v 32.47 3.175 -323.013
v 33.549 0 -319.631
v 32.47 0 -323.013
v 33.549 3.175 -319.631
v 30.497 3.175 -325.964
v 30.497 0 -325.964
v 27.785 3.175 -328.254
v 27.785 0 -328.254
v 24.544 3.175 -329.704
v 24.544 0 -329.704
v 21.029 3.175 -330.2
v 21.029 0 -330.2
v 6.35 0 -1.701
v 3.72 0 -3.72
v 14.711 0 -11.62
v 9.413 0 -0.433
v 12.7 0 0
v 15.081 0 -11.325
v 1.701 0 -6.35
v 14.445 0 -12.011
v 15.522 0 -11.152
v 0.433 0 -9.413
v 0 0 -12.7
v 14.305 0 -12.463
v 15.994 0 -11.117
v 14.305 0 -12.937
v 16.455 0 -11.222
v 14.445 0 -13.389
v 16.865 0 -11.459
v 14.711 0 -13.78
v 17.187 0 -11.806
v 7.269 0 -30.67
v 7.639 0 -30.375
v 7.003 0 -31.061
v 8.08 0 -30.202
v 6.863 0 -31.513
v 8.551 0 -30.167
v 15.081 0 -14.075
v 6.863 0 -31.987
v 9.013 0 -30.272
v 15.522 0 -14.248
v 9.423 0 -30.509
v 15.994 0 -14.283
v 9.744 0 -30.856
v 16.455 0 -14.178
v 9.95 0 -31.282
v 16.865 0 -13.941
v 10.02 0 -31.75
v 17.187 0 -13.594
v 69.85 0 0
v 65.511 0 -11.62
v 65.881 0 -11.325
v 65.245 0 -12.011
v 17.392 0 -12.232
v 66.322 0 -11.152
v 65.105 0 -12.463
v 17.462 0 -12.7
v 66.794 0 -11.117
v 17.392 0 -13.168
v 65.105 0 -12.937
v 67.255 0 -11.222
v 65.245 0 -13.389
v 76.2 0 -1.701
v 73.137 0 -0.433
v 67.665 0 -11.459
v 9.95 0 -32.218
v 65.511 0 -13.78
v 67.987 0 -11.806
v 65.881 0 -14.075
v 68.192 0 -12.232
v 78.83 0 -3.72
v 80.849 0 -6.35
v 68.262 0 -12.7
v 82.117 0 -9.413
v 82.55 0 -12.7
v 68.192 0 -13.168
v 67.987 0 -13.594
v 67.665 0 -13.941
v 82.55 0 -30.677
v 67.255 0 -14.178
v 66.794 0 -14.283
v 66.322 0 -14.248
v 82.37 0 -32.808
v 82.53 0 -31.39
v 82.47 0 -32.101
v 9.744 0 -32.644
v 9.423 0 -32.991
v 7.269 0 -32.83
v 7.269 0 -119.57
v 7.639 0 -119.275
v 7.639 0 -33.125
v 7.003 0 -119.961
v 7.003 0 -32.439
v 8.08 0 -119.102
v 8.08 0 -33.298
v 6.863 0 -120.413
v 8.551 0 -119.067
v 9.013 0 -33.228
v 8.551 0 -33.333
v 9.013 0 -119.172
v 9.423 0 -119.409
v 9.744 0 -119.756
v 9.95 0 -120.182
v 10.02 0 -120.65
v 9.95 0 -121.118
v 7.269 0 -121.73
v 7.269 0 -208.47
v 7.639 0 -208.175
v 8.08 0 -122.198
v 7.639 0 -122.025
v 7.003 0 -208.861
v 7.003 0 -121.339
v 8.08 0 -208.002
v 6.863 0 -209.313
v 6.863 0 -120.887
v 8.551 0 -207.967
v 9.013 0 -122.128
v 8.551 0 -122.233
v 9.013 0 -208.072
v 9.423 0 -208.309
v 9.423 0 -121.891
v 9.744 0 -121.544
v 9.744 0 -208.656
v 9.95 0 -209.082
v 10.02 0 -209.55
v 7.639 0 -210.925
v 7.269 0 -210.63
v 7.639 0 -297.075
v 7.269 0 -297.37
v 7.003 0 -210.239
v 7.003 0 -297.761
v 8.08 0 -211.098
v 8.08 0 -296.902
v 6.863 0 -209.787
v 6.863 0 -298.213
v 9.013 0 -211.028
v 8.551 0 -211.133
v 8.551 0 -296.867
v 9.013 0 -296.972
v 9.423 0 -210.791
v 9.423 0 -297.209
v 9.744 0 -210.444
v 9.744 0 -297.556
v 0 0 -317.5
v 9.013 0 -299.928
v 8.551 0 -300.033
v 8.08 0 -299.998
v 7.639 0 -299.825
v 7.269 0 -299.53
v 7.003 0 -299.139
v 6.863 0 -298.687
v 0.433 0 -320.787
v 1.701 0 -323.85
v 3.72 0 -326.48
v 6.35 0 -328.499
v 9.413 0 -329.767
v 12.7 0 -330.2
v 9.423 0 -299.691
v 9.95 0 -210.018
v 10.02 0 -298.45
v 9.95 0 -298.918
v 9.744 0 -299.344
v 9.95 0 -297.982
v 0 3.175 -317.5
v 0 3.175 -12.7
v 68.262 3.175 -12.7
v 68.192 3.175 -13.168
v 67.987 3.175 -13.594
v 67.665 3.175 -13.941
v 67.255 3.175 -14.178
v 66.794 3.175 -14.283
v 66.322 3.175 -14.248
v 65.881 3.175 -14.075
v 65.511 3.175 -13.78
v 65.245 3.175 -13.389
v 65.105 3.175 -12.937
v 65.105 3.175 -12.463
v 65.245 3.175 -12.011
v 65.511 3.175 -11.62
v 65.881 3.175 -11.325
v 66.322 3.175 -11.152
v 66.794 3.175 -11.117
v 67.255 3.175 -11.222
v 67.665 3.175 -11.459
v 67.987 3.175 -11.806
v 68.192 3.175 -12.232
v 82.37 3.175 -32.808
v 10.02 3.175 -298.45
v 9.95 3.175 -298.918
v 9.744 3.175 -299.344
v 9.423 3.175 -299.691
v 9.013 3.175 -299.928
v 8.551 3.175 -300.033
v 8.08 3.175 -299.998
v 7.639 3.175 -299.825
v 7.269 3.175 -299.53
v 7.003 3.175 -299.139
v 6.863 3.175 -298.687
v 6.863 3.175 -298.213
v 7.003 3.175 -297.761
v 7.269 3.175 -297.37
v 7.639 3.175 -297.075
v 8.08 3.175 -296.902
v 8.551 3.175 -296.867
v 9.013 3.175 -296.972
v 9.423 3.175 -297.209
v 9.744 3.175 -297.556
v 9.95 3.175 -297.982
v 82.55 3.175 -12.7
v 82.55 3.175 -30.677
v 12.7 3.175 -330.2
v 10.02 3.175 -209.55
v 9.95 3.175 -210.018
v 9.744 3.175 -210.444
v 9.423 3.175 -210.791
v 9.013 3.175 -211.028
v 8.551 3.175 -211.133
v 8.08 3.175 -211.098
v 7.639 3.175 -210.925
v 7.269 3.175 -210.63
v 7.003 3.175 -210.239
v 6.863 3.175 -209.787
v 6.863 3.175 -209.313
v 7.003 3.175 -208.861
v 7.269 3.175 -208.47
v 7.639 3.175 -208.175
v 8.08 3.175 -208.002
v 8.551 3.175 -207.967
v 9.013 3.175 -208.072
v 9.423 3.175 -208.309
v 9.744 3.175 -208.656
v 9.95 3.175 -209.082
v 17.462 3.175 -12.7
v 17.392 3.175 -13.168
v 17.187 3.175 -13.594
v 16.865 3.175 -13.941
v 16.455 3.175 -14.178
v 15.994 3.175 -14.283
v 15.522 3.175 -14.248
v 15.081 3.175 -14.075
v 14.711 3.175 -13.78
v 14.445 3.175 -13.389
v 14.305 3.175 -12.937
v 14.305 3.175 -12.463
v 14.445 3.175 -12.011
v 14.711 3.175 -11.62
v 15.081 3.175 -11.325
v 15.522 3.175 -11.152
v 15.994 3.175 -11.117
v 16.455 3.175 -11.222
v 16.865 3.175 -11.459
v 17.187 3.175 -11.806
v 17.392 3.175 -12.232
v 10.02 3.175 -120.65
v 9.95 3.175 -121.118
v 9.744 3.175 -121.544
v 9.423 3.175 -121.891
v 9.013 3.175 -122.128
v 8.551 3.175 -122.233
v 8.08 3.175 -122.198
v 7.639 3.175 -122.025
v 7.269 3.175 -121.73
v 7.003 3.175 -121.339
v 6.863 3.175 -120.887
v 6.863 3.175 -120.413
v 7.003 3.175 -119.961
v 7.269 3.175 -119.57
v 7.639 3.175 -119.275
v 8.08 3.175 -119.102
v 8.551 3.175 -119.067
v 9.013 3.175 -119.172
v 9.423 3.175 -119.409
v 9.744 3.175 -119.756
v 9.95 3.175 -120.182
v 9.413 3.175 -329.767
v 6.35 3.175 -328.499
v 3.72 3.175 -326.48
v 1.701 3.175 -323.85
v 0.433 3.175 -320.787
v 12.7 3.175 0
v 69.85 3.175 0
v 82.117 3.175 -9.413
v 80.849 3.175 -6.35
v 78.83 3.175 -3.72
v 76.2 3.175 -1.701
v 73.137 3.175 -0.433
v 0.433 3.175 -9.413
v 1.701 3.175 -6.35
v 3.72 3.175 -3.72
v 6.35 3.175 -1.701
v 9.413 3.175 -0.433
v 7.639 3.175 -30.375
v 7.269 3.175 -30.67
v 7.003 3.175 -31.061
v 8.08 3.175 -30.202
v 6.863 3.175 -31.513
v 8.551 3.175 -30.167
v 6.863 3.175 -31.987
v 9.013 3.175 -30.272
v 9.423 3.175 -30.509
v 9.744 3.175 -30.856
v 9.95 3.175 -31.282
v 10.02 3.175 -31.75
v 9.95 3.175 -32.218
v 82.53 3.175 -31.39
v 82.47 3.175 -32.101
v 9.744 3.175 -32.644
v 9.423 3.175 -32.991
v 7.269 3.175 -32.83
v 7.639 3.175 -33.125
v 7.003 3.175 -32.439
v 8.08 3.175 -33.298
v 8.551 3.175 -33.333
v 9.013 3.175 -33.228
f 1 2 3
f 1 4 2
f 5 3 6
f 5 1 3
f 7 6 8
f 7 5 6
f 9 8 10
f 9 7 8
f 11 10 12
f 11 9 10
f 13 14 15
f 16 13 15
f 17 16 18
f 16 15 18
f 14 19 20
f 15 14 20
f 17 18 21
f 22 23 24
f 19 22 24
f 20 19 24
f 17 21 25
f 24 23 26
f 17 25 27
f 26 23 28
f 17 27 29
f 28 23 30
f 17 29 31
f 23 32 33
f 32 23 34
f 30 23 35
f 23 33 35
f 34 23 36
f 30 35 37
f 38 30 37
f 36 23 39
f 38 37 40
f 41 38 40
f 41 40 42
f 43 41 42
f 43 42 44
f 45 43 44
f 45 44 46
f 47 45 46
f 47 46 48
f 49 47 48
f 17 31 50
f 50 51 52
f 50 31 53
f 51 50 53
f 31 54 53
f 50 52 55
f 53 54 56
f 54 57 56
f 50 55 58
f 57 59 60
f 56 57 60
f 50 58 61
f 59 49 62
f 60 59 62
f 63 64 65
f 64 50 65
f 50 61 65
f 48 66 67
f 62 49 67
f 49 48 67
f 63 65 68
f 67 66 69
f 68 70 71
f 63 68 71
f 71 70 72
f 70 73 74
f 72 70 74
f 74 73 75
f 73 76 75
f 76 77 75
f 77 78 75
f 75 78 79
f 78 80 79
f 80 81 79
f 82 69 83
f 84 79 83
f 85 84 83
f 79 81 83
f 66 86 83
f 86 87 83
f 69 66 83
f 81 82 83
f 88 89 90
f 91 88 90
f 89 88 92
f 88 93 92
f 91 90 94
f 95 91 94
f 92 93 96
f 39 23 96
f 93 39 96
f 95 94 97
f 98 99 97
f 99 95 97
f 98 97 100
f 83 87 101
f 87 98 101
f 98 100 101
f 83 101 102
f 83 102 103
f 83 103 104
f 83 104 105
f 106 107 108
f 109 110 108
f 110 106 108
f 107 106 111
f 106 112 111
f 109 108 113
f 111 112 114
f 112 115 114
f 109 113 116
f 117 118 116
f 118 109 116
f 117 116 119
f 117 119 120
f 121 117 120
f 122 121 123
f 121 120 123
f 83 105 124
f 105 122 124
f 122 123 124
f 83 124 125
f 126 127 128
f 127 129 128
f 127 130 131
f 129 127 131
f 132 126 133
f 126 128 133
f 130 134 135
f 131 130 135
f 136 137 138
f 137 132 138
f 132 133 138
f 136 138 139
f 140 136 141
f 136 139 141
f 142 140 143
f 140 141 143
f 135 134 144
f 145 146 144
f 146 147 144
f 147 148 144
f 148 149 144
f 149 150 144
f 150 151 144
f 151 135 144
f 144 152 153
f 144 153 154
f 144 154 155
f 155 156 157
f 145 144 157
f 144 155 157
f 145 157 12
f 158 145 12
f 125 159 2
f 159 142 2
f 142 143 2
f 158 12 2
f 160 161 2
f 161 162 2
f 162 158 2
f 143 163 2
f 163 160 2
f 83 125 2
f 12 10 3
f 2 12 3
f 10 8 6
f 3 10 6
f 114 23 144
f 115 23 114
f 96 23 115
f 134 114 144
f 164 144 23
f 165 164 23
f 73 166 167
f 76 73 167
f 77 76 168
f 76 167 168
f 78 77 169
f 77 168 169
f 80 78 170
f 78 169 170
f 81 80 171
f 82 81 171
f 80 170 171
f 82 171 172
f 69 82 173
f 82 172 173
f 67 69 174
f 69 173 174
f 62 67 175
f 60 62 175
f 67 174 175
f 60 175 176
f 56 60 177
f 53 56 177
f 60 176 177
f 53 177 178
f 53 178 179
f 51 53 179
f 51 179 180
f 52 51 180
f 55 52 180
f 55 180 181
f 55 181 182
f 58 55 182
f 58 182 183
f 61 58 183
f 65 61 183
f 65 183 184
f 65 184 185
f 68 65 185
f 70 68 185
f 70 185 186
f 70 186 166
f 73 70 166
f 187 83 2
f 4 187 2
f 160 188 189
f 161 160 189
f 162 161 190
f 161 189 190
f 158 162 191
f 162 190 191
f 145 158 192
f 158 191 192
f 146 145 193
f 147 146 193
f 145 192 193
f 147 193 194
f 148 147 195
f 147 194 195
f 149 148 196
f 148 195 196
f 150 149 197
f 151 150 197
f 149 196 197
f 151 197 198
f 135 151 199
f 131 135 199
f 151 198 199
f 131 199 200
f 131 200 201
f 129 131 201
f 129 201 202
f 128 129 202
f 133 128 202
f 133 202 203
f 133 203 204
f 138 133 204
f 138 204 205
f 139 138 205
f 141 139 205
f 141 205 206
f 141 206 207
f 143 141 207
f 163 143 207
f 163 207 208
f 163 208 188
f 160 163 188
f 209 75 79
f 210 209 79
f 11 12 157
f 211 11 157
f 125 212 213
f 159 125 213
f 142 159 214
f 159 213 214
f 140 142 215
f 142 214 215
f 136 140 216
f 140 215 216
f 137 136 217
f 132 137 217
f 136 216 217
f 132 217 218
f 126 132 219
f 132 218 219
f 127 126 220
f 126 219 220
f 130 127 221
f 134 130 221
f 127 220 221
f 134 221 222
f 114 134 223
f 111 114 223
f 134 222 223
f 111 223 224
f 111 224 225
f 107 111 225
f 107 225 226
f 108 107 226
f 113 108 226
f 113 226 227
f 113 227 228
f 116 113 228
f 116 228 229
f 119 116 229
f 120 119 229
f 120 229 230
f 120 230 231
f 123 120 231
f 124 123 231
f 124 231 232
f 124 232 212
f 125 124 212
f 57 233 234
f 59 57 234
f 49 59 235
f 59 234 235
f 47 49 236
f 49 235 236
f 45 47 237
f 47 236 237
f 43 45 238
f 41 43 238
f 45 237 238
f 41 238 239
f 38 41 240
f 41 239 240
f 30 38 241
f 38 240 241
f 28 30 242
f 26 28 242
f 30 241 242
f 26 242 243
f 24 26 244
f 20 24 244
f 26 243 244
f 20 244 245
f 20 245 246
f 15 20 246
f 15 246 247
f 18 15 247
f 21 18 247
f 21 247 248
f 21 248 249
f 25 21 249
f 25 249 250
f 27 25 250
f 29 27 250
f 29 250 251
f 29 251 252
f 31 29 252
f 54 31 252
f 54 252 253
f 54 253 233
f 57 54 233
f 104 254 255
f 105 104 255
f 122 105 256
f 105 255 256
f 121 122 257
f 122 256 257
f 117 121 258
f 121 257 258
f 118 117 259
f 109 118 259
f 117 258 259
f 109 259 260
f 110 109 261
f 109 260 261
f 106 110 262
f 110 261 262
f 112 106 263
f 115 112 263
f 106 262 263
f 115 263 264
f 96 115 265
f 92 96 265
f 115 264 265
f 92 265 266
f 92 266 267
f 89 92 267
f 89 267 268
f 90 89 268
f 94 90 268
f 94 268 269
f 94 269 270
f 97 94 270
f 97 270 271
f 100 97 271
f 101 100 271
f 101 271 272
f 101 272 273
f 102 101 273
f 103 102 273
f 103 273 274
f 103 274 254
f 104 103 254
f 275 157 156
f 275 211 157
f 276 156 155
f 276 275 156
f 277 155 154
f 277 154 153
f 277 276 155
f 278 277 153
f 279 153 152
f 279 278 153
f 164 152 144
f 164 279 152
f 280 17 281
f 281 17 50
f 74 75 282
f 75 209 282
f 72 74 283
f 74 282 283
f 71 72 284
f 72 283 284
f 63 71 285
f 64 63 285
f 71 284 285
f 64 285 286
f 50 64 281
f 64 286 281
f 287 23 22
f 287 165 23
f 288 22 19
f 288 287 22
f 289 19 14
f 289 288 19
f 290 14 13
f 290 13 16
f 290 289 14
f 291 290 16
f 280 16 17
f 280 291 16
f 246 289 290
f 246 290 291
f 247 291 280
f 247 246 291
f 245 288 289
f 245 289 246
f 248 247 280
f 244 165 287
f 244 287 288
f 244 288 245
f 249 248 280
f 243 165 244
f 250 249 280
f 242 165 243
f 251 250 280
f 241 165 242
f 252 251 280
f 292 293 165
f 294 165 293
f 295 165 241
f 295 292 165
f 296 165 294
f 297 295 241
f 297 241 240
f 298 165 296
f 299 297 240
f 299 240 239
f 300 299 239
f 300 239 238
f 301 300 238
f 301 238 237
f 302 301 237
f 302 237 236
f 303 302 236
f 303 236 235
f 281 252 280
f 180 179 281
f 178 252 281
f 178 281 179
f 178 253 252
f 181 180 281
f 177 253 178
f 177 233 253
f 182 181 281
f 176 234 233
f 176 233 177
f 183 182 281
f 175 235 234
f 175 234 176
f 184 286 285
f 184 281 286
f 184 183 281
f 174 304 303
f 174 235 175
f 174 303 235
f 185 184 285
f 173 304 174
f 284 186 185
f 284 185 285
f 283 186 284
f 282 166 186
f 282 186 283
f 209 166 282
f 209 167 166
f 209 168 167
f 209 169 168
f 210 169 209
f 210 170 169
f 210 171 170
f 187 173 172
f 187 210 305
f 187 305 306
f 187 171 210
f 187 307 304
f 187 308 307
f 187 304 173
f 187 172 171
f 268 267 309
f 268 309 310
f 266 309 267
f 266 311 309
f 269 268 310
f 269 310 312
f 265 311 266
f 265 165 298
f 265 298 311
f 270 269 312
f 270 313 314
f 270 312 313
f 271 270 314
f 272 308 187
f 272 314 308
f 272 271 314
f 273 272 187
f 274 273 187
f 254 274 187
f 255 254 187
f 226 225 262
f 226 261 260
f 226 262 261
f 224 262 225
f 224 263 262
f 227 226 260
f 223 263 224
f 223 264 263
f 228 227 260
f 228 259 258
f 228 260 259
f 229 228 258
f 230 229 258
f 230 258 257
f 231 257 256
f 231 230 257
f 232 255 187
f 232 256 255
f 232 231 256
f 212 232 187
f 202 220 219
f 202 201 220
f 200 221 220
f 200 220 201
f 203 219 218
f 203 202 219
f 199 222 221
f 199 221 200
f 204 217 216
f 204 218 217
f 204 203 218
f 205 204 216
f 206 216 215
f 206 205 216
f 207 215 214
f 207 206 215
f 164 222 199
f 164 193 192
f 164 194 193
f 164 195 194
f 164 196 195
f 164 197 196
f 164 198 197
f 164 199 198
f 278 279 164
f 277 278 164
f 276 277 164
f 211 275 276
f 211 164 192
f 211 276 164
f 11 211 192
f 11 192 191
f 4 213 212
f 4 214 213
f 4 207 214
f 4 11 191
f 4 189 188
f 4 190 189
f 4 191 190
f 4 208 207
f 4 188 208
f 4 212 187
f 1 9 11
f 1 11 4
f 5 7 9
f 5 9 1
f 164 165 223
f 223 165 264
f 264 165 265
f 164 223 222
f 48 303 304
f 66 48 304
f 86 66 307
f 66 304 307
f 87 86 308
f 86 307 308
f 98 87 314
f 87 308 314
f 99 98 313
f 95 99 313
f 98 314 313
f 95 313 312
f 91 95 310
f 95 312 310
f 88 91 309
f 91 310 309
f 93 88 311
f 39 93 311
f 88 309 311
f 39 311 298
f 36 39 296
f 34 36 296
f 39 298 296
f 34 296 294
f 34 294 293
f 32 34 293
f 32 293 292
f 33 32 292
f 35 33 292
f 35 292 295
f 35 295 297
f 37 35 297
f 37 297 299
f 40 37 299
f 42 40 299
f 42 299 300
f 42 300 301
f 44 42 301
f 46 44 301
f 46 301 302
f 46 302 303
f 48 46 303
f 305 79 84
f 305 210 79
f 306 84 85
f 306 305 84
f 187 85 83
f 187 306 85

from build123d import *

# Parameters (mm, degrees)
BOSS_EXTRUDE1_DEPTH          = 3.175
FILLET1_R                    = 12.7
F_1_8_0_125_DIAMETER_HOLE1_D = 3.175


with BuildPart() as part:
    # Sketch1 → Boss-Extrude1 (new body)
    with BuildSketch(Plane(origin=(0, 0, 0), x_dir=(1, 0, 0), z_dir=(0, 1, 0))):
        Polygon((31.75, 0), (82.55, 0), (82.55, 31.75), (31.75, 330.2), (0, 330.2), (0, 0), align=None)
    extrude(amount=BOSS_EXTRUDE1_DEPTH)

    # Fillet1
    fillet1_edges = [part.edges().sort_by_distance(p)[0] for p in [
        (0, 1.5875, -330.2),
        (31.75, 1.5875, -330.2),
        (82.55, 1.5875, -31.75),
        (82.55, 1.5875, 0),
        (0, 1.5875, 0),
    ]]
    fillet(fillet1_edges, radius=FILLET1_R)

    # 1/8 (0.125) Diameter Hole1 (through all)
    with Locations(Plane(origin=(0, 0, 0), x_dir=(-1, 0, 0), z_dir=(0, -1, 0))):
        with Locations((-8.4328, 298.45), (-8.4328, 209.55), (-8.4328, 120.65), (-8.4328, 31.75), (-66.675, 12.7), (-15.875, 12.7)):
            Hole(F_1_8_0_125_DIAMETER_HOLE1_D / 2)


solid = part.part
